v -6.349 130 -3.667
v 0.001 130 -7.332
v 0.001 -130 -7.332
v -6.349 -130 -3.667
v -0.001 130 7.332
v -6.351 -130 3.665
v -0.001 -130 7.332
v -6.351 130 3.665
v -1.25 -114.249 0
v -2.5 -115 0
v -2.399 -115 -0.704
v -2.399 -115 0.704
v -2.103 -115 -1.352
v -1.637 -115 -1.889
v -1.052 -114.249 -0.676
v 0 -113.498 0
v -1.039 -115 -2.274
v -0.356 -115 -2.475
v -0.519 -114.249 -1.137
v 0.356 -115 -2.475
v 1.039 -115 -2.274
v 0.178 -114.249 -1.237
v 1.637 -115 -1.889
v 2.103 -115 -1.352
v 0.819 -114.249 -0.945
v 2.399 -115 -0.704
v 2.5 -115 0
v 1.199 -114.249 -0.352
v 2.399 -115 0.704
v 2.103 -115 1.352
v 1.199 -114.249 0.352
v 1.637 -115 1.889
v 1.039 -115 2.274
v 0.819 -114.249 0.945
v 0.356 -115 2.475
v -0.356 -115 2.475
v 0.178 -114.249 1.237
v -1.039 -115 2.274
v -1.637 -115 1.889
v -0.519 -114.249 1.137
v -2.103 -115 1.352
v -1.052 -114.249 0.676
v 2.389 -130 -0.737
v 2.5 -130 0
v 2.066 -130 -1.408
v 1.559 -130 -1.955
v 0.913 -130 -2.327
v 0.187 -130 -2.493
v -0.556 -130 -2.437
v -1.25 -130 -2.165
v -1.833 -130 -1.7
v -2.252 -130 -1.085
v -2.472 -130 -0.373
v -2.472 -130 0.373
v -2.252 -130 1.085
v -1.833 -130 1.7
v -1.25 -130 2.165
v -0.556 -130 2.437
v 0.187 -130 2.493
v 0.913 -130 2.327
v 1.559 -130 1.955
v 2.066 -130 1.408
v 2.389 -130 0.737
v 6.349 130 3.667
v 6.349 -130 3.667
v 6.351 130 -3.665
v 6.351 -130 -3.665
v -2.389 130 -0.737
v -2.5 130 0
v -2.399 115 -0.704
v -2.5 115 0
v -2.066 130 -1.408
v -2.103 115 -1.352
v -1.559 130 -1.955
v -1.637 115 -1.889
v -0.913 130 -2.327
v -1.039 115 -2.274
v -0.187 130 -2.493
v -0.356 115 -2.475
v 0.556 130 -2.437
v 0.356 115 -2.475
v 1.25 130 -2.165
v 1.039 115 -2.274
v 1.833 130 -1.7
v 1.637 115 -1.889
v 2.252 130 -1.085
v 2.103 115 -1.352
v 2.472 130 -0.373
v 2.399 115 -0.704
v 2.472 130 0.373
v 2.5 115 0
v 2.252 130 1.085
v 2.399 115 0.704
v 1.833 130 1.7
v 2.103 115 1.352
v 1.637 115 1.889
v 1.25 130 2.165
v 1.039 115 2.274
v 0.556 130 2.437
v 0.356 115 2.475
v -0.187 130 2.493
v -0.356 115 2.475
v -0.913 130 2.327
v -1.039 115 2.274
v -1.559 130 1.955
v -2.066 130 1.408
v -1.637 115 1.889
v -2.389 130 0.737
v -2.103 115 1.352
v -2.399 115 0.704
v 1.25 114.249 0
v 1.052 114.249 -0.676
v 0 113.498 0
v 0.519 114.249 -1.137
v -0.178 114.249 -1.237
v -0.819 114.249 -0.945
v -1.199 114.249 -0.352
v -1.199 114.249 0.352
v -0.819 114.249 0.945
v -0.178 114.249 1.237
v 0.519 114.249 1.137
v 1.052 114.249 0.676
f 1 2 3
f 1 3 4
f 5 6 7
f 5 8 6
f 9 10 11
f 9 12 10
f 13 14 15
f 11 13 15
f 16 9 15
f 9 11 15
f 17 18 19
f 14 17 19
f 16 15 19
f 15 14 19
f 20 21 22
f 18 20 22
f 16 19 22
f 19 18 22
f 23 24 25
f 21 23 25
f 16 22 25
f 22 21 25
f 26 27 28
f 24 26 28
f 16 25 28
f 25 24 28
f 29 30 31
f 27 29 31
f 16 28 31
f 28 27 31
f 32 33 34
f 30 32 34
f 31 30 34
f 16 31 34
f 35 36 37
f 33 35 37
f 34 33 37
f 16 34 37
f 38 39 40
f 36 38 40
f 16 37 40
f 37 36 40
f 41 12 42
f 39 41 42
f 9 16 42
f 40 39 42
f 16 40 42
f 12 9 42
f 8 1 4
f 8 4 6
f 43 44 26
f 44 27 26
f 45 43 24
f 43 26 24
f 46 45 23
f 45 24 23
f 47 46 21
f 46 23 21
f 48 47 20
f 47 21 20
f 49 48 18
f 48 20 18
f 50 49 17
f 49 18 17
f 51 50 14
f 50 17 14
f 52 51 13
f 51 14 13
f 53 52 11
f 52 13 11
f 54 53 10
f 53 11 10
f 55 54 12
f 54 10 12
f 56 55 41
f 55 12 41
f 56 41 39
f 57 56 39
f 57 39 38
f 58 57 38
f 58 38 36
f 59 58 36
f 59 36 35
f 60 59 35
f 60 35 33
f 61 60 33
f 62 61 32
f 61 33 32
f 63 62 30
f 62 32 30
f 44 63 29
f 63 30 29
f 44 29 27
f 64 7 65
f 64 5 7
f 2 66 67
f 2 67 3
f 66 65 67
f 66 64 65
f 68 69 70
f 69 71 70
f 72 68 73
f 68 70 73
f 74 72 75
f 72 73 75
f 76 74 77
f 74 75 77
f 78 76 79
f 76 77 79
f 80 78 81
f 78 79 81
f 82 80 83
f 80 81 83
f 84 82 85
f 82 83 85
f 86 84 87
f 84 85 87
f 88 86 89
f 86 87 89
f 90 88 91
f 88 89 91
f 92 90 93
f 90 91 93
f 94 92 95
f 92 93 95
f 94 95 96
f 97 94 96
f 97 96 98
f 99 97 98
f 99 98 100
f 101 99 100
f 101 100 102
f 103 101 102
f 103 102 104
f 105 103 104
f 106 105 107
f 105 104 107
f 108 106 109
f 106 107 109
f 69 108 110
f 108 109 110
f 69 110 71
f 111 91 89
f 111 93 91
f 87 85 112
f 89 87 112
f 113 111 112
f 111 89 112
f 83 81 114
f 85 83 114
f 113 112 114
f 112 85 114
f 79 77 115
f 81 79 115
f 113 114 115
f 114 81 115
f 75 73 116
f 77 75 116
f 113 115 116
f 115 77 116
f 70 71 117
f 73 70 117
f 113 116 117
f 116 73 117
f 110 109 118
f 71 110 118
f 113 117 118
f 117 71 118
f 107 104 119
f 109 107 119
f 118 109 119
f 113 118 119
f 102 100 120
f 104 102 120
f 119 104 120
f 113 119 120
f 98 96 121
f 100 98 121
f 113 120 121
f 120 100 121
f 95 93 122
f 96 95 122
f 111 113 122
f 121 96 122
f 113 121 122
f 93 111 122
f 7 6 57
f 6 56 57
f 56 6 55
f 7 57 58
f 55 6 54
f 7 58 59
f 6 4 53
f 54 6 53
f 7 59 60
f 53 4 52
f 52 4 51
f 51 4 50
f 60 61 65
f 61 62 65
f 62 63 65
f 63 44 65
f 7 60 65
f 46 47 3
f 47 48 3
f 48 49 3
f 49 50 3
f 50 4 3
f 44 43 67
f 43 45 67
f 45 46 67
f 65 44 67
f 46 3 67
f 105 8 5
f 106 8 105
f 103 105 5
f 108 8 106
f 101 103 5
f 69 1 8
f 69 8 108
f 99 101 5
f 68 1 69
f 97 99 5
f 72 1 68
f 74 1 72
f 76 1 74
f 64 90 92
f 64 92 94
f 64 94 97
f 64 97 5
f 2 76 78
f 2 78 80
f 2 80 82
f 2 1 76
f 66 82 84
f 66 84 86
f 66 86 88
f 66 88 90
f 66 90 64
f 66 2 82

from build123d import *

# Parameters (mm, degrees)
BOSS_EXTRUDE1_DEPTH       = 130
M6X1_0_TAPPED_HOLE1_D     = 5
M6X1_0_TAPPED_HOLE1_DEPTH = 15
M6X1_0_TAPPED_HOLE1_TIP   = 1.502151548
M6X1_0_TAPPED_HOLE2_D     = 5
M6X1_0_TAPPED_HOLE2_DEPTH = 15
M6X1_0_TAPPED_HOLE2_TIP   = 1.502151548


with BuildPart() as part:
    # Sketch1 → Boss-Extrude1 (new, symmetric)
    with BuildSketch(Plane(origin=(0, 0, 0), x_dir=(1, 0, 0), z_dir=(0, 1, 0))):
        Polygon((6.349472256, -3.667088137), (6.350527612, 3.665260206), (0.001055356, 7.332348343), (-6.349472256, 3.667088137), (-6.350527612, -3.665260206), (-0.001055356, -7.332348343), align=None)
    extrude(amount=BOSS_EXTRUDE1_DEPTH, both=True)

    # M6x1.0 Tapped Hole1
    with Locations(Plane(origin=(0, 130, 0), x_dir=(1, 0, 0), z_dir=(0, 1, 0))):
        with Locations((0, 0)):
            Hole(M6X1_0_TAPPED_HOLE1_D / 2, depth=M6X1_0_TAPPED_HOLE1_DEPTH)
            with Locations((0, 0, -(M6X1_0_TAPPED_HOLE1_DEPTH + M6X1_0_TAPPED_HOLE1_TIP / 2))):  # 118° drill point
                Cone(0, M6X1_0_TAPPED_HOLE1_D / 2, M6X1_0_TAPPED_HOLE1_TIP, mode=Mode.SUBTRACT)

    # M6x1.0 Tapped Hole2
    with Locations(Plane(origin=(0, -130, 0), x_dir=(-1, 0, 0), z_dir=(0, -1, 0))):
        with Locations((0, 0)):
            Hole(M6X1_0_TAPPED_HOLE2_D / 2, depth=M6X1_0_TAPPED_HOLE2_DEPTH)
            with Locations((0, 0, -(M6X1_0_TAPPED_HOLE2_DEPTH + M6X1_0_TAPPED_HOLE2_TIP / 2))):  # 118° drill point
                Cone(0, M6X1_0_TAPPED_HOLE2_D / 2, M6X1_0_TAPPED_HOLE2_TIP, mode=Mode.SUBTRACT)


solid = part.part
